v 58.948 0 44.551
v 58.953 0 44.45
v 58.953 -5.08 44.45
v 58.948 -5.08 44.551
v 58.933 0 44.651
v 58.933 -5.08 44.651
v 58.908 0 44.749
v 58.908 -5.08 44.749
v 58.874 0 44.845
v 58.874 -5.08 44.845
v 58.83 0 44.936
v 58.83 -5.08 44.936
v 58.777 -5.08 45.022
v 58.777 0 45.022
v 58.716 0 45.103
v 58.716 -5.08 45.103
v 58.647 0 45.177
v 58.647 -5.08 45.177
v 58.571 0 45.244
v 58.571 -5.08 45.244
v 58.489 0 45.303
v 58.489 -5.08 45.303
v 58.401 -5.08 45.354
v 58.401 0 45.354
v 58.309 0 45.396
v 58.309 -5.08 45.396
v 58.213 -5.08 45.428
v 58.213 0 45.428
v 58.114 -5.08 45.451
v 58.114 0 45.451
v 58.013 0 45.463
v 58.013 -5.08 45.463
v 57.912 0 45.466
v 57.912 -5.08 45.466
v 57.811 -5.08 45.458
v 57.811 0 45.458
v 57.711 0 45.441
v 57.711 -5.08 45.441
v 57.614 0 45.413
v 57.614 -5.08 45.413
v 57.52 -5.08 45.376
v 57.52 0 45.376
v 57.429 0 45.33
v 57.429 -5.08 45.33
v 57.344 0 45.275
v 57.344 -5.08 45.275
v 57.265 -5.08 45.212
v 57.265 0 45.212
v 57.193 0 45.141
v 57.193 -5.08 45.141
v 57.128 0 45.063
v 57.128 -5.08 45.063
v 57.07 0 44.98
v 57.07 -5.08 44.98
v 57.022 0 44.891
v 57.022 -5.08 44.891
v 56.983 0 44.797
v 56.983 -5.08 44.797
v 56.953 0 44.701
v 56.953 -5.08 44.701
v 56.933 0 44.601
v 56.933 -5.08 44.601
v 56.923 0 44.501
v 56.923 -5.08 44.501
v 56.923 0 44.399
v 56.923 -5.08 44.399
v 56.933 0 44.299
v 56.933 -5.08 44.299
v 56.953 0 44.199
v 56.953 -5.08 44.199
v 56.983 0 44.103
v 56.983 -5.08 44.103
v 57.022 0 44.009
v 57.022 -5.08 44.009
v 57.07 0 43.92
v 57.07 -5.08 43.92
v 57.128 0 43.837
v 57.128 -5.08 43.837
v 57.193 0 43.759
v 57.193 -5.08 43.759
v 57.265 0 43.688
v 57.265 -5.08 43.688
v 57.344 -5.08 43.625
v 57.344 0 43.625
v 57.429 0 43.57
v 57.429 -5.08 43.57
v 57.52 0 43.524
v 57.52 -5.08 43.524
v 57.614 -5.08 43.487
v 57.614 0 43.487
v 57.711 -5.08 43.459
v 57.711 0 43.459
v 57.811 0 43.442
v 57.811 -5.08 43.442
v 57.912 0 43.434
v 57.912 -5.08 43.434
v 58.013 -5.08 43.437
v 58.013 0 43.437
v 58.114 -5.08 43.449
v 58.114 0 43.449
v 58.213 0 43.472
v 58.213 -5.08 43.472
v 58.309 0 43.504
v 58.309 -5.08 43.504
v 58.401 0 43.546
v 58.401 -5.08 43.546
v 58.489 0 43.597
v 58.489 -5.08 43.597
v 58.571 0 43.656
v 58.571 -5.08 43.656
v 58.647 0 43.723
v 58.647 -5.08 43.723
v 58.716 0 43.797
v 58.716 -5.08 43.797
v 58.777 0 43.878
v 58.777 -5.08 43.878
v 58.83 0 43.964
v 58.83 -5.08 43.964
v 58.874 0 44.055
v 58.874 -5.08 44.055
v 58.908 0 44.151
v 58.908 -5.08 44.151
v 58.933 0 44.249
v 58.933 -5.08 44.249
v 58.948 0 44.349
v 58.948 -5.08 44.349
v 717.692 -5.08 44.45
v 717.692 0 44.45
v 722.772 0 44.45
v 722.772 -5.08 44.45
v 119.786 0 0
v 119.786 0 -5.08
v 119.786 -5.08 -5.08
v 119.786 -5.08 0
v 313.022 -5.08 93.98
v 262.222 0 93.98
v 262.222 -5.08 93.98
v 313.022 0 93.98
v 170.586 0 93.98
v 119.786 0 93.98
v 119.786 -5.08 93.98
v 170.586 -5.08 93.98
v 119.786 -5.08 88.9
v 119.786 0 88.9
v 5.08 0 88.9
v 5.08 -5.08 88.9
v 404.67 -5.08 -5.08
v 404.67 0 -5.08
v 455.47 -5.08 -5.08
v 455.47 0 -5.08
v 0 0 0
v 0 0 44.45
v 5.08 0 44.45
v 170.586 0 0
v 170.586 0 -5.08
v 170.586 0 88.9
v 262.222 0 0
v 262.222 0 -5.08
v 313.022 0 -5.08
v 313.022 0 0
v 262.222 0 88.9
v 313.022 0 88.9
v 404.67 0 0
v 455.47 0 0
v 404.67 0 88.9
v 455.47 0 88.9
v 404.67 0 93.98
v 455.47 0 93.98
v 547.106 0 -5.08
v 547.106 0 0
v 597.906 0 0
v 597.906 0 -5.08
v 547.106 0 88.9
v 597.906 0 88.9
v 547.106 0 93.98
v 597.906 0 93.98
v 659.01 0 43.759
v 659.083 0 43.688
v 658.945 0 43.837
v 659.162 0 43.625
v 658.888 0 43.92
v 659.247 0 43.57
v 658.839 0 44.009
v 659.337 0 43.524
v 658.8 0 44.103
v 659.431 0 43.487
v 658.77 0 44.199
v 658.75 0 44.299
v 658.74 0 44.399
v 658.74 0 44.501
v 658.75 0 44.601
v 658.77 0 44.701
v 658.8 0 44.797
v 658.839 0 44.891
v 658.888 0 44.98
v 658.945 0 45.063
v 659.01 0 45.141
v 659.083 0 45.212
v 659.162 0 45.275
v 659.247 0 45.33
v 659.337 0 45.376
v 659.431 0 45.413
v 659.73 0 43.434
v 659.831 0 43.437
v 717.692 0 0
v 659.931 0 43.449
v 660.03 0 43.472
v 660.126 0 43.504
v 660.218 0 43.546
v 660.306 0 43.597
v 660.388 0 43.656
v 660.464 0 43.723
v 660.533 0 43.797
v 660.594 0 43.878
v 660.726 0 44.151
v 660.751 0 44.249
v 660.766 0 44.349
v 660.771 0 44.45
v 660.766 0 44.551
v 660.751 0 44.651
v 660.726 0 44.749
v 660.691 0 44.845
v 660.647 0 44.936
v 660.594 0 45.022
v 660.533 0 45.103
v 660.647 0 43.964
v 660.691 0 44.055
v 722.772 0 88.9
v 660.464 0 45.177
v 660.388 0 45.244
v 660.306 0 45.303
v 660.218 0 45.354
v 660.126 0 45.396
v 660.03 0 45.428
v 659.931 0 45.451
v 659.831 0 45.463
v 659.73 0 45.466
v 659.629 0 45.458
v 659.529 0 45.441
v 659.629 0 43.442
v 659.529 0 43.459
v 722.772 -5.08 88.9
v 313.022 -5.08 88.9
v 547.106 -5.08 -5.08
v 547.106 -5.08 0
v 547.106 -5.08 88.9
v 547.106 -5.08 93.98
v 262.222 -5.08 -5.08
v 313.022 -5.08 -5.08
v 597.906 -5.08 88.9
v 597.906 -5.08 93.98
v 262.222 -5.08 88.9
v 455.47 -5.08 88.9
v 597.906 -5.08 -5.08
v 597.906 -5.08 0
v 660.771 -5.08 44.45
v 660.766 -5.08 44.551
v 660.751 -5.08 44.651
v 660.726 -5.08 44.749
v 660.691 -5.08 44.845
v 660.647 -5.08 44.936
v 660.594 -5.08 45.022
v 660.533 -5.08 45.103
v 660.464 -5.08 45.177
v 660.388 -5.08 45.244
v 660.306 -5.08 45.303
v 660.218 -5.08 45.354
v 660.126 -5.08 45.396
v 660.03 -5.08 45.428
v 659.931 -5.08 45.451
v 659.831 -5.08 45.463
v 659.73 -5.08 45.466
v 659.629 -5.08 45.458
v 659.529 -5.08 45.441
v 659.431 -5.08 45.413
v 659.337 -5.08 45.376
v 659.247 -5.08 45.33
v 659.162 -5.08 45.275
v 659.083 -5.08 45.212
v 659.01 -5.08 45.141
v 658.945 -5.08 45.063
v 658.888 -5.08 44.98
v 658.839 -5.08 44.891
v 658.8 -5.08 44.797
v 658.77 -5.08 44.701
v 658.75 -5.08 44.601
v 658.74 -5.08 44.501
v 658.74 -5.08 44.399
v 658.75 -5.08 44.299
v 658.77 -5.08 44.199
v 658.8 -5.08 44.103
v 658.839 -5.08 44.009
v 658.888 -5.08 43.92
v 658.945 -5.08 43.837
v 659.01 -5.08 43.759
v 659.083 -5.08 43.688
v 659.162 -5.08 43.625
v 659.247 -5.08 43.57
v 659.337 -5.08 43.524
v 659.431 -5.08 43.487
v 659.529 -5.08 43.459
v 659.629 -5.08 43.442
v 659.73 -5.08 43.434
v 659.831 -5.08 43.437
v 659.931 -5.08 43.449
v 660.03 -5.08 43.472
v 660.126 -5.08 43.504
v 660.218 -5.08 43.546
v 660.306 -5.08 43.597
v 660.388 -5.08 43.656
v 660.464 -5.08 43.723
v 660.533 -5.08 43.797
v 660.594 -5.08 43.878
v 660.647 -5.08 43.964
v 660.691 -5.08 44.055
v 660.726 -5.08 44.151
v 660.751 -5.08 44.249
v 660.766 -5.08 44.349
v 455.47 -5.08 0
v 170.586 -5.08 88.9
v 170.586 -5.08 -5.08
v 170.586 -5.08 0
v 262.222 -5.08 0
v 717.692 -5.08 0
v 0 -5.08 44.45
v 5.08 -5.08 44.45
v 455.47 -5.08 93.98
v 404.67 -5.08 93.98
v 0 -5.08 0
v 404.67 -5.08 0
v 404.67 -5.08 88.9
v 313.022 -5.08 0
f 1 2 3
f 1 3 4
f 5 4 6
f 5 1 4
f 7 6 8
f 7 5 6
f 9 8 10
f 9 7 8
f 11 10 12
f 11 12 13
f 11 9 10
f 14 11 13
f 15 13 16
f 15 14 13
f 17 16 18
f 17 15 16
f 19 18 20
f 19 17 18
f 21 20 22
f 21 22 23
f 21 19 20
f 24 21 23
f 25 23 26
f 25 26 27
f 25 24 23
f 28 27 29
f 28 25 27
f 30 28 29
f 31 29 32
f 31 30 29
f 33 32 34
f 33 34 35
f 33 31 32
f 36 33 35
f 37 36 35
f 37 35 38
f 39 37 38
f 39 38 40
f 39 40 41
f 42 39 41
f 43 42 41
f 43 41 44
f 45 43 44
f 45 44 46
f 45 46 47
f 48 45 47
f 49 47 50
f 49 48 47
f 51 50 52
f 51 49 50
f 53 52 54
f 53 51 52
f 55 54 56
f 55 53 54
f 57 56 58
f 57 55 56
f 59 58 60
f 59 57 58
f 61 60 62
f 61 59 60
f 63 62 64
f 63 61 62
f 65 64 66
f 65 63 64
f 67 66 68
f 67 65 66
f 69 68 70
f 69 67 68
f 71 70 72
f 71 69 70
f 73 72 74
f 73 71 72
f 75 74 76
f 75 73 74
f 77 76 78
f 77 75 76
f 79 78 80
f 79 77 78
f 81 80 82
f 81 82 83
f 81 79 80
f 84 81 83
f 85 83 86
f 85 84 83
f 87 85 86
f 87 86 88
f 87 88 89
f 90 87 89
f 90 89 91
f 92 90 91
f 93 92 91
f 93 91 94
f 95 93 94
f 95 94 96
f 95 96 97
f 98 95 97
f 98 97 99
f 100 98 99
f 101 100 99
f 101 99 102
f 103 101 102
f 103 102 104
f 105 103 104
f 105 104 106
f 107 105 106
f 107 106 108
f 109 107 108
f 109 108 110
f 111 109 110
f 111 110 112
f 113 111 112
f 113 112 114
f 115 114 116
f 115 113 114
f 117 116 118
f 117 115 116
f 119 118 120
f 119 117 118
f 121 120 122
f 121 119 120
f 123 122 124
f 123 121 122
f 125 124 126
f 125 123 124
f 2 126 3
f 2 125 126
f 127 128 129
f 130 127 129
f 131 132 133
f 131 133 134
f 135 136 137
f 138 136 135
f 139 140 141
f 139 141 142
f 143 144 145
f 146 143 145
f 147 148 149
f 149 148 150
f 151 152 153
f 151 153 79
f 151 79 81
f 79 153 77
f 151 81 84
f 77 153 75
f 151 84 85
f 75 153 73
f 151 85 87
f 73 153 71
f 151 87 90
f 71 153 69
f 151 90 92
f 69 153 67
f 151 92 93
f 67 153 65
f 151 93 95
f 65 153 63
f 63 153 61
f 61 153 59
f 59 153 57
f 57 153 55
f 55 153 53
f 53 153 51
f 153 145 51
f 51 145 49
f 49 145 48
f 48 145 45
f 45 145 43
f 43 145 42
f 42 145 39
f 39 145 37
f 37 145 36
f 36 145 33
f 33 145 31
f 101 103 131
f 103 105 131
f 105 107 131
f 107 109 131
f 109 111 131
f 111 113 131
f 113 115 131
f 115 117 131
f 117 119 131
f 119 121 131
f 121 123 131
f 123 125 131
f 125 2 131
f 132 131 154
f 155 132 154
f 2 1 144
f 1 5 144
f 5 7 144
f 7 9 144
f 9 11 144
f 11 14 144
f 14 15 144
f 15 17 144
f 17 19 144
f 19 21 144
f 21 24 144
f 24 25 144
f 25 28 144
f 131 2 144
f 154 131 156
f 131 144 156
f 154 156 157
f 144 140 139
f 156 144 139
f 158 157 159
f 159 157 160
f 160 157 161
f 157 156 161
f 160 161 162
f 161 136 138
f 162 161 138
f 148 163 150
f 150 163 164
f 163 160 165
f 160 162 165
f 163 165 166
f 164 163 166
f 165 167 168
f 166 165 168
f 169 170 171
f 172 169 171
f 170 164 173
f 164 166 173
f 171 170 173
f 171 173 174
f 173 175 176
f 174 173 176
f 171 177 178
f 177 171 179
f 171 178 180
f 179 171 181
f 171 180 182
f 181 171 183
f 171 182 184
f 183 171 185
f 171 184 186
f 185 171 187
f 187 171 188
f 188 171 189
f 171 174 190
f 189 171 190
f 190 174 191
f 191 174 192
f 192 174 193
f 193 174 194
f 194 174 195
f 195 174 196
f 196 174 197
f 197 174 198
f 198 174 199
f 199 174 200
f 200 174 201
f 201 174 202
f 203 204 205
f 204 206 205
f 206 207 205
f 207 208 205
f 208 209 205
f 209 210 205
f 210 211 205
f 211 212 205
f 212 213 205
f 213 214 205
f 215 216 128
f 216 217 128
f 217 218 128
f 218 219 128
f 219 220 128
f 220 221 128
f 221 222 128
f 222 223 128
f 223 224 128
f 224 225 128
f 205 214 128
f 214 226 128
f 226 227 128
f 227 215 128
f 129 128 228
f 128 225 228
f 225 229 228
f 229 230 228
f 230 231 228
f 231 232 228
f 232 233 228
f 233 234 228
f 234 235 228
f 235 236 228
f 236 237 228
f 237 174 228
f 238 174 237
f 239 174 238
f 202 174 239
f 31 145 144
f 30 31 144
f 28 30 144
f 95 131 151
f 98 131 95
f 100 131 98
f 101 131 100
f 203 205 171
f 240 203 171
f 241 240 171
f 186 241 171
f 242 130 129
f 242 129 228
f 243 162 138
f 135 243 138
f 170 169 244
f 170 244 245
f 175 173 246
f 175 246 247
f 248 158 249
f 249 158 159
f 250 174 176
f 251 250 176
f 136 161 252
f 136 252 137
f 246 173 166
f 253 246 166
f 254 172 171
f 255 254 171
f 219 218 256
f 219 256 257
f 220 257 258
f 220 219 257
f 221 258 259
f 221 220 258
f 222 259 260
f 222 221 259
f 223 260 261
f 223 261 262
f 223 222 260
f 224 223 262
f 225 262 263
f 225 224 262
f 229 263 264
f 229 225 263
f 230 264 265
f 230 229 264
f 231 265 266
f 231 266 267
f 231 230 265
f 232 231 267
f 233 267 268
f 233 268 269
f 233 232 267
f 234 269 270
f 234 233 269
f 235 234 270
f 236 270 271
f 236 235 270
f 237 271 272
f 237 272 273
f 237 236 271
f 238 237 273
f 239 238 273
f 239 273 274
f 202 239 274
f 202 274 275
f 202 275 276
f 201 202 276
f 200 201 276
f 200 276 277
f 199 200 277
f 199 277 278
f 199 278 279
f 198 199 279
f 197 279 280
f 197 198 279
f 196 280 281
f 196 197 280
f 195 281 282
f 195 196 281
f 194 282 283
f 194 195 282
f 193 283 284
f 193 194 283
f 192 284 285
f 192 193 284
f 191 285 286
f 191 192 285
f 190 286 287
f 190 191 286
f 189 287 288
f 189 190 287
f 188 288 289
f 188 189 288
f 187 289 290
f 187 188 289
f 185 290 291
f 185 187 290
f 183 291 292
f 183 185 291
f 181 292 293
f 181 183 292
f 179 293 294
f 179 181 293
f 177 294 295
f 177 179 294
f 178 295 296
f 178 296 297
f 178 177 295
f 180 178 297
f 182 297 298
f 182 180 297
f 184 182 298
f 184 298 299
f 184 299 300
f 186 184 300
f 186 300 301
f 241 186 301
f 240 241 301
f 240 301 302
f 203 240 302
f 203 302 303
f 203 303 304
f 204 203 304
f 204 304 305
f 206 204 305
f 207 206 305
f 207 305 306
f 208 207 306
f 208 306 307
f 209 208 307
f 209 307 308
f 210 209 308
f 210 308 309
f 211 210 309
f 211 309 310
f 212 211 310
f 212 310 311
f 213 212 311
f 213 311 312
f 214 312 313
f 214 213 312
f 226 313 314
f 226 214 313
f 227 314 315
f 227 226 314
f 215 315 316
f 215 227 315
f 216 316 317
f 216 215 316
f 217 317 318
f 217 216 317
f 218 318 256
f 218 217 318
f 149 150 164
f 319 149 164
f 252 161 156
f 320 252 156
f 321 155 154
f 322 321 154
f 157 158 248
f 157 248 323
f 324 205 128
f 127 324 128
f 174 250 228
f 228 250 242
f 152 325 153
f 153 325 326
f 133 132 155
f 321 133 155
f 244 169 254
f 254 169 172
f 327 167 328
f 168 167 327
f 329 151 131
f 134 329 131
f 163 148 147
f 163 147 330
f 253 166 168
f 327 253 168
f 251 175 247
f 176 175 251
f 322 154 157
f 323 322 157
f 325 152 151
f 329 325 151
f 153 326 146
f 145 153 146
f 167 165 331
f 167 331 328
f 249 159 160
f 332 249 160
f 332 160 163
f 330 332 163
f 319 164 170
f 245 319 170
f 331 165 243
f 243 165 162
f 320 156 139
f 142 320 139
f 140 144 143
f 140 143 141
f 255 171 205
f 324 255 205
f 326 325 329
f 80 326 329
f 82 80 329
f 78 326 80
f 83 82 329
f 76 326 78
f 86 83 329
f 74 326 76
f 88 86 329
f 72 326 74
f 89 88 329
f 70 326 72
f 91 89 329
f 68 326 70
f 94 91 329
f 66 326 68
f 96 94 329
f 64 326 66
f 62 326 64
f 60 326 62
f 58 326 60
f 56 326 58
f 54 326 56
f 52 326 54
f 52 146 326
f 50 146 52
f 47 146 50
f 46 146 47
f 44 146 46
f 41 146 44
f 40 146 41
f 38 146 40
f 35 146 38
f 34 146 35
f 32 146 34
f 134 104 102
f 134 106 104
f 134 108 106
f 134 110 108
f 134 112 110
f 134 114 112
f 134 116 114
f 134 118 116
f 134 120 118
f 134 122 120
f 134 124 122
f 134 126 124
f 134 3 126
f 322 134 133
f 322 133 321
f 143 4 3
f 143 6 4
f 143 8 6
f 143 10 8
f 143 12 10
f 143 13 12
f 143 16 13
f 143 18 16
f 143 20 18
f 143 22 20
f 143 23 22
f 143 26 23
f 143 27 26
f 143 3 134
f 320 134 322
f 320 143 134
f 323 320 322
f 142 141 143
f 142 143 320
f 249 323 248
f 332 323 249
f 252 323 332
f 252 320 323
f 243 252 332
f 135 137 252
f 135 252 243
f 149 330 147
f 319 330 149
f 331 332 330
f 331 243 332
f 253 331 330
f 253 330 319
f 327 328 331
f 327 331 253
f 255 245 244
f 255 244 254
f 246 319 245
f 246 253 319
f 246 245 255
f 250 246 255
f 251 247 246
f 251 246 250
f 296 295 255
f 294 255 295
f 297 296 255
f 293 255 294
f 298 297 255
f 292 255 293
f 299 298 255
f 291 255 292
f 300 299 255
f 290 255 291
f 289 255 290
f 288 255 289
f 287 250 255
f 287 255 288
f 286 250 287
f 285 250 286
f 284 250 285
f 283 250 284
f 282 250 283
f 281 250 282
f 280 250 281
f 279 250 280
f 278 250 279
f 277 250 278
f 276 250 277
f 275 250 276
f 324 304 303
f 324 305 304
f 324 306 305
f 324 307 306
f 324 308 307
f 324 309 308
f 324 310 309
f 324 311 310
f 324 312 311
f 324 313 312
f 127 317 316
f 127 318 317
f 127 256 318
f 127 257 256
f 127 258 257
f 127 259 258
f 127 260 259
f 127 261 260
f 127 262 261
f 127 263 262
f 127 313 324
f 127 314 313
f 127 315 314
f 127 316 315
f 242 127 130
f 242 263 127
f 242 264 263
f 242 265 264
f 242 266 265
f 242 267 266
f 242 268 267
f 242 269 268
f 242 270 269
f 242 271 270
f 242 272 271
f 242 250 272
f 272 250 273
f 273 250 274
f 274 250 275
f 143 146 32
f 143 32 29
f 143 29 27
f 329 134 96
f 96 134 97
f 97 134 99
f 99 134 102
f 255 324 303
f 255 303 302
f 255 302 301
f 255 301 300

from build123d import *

# Parameters (mm, degrees)
F0_R     = 1.016
F0_W     = 50.8
F0_H     = 5.08
F1_DEPTH = 5.08
F2_W     = 5.08
F2_H     = 44.45
F3_DEPTH = 5.081
F4_DEPTH = 5.08


with BuildPart() as f1:
    # F0 (on Front) → F1 (new body)
    with BuildSketch(Plane.XZ):
        Polygon((0, 88.9), (0, 0), (119.7864, 0), (170.5864, 0), (262.22198, 0), (313.02198, 0), (404.67026, 0), (455.47026, 0), (547.10584, 0), (597.90584, 0), (717.69224, 0), (717.69224, 88.9), (597.90584, 88.9), (547.10584, 88.9), (455.47026, 88.9), (404.67026, 88.9), (313.02198, 88.9), (262.22198, 88.9), (170.5864, 88.9), (119.7864, 88.9), align=None)
        with Locations((57.9374, 44.45)):
            Circle(F0_R, mode=Mode.SUBTRACT)
        with Locations((659.75484, 44.45)):
            Circle(F0_R, mode=Mode.SUBTRACT)
        with Locations((145.1864, 91.44)):
            Rectangle(F0_W, F0_H)
        with Locations((145.1864, -2.54)):
            Rectangle(F0_W, F0_H)
        with Locations((287.62198, -2.54)):
            Rectangle(F0_W, F0_H)
        with Locations((287.62198, 91.44)):
            Rectangle(F0_W, F0_H)
        with Locations((430.07026, 91.44)):
            Rectangle(F0_W, F0_H)
        with Locations((430.07026, -2.54)):
            Rectangle(F0_W, F0_H)
        with Locations((572.50584, 91.44)):
            Rectangle(F0_W, F0_H)
        with Locations((572.50584, -2.54)):
            Rectangle(F0_W, F0_H)
    extrude(amount=F1_DEPTH)

    # F2 (on face) → F3 (cut, through all)
    with BuildSketch(Plane.XZ.offset(5.08)):
        with Locations((2.54, 66.675)):
            Rectangle(F2_W, F2_H)
    extrude(amount=-F3_DEPTH, mode=Mode.SUBTRACT)

    # F2 (on face) → F4 (join)
    with BuildSketch(Plane.XZ.offset(5.08)):
        with Locations((720.23224, 66.675)):
            Rectangle(F2_W, F2_H)
    extrude(amount=-F4_DEPTH)


solid = f1.part
